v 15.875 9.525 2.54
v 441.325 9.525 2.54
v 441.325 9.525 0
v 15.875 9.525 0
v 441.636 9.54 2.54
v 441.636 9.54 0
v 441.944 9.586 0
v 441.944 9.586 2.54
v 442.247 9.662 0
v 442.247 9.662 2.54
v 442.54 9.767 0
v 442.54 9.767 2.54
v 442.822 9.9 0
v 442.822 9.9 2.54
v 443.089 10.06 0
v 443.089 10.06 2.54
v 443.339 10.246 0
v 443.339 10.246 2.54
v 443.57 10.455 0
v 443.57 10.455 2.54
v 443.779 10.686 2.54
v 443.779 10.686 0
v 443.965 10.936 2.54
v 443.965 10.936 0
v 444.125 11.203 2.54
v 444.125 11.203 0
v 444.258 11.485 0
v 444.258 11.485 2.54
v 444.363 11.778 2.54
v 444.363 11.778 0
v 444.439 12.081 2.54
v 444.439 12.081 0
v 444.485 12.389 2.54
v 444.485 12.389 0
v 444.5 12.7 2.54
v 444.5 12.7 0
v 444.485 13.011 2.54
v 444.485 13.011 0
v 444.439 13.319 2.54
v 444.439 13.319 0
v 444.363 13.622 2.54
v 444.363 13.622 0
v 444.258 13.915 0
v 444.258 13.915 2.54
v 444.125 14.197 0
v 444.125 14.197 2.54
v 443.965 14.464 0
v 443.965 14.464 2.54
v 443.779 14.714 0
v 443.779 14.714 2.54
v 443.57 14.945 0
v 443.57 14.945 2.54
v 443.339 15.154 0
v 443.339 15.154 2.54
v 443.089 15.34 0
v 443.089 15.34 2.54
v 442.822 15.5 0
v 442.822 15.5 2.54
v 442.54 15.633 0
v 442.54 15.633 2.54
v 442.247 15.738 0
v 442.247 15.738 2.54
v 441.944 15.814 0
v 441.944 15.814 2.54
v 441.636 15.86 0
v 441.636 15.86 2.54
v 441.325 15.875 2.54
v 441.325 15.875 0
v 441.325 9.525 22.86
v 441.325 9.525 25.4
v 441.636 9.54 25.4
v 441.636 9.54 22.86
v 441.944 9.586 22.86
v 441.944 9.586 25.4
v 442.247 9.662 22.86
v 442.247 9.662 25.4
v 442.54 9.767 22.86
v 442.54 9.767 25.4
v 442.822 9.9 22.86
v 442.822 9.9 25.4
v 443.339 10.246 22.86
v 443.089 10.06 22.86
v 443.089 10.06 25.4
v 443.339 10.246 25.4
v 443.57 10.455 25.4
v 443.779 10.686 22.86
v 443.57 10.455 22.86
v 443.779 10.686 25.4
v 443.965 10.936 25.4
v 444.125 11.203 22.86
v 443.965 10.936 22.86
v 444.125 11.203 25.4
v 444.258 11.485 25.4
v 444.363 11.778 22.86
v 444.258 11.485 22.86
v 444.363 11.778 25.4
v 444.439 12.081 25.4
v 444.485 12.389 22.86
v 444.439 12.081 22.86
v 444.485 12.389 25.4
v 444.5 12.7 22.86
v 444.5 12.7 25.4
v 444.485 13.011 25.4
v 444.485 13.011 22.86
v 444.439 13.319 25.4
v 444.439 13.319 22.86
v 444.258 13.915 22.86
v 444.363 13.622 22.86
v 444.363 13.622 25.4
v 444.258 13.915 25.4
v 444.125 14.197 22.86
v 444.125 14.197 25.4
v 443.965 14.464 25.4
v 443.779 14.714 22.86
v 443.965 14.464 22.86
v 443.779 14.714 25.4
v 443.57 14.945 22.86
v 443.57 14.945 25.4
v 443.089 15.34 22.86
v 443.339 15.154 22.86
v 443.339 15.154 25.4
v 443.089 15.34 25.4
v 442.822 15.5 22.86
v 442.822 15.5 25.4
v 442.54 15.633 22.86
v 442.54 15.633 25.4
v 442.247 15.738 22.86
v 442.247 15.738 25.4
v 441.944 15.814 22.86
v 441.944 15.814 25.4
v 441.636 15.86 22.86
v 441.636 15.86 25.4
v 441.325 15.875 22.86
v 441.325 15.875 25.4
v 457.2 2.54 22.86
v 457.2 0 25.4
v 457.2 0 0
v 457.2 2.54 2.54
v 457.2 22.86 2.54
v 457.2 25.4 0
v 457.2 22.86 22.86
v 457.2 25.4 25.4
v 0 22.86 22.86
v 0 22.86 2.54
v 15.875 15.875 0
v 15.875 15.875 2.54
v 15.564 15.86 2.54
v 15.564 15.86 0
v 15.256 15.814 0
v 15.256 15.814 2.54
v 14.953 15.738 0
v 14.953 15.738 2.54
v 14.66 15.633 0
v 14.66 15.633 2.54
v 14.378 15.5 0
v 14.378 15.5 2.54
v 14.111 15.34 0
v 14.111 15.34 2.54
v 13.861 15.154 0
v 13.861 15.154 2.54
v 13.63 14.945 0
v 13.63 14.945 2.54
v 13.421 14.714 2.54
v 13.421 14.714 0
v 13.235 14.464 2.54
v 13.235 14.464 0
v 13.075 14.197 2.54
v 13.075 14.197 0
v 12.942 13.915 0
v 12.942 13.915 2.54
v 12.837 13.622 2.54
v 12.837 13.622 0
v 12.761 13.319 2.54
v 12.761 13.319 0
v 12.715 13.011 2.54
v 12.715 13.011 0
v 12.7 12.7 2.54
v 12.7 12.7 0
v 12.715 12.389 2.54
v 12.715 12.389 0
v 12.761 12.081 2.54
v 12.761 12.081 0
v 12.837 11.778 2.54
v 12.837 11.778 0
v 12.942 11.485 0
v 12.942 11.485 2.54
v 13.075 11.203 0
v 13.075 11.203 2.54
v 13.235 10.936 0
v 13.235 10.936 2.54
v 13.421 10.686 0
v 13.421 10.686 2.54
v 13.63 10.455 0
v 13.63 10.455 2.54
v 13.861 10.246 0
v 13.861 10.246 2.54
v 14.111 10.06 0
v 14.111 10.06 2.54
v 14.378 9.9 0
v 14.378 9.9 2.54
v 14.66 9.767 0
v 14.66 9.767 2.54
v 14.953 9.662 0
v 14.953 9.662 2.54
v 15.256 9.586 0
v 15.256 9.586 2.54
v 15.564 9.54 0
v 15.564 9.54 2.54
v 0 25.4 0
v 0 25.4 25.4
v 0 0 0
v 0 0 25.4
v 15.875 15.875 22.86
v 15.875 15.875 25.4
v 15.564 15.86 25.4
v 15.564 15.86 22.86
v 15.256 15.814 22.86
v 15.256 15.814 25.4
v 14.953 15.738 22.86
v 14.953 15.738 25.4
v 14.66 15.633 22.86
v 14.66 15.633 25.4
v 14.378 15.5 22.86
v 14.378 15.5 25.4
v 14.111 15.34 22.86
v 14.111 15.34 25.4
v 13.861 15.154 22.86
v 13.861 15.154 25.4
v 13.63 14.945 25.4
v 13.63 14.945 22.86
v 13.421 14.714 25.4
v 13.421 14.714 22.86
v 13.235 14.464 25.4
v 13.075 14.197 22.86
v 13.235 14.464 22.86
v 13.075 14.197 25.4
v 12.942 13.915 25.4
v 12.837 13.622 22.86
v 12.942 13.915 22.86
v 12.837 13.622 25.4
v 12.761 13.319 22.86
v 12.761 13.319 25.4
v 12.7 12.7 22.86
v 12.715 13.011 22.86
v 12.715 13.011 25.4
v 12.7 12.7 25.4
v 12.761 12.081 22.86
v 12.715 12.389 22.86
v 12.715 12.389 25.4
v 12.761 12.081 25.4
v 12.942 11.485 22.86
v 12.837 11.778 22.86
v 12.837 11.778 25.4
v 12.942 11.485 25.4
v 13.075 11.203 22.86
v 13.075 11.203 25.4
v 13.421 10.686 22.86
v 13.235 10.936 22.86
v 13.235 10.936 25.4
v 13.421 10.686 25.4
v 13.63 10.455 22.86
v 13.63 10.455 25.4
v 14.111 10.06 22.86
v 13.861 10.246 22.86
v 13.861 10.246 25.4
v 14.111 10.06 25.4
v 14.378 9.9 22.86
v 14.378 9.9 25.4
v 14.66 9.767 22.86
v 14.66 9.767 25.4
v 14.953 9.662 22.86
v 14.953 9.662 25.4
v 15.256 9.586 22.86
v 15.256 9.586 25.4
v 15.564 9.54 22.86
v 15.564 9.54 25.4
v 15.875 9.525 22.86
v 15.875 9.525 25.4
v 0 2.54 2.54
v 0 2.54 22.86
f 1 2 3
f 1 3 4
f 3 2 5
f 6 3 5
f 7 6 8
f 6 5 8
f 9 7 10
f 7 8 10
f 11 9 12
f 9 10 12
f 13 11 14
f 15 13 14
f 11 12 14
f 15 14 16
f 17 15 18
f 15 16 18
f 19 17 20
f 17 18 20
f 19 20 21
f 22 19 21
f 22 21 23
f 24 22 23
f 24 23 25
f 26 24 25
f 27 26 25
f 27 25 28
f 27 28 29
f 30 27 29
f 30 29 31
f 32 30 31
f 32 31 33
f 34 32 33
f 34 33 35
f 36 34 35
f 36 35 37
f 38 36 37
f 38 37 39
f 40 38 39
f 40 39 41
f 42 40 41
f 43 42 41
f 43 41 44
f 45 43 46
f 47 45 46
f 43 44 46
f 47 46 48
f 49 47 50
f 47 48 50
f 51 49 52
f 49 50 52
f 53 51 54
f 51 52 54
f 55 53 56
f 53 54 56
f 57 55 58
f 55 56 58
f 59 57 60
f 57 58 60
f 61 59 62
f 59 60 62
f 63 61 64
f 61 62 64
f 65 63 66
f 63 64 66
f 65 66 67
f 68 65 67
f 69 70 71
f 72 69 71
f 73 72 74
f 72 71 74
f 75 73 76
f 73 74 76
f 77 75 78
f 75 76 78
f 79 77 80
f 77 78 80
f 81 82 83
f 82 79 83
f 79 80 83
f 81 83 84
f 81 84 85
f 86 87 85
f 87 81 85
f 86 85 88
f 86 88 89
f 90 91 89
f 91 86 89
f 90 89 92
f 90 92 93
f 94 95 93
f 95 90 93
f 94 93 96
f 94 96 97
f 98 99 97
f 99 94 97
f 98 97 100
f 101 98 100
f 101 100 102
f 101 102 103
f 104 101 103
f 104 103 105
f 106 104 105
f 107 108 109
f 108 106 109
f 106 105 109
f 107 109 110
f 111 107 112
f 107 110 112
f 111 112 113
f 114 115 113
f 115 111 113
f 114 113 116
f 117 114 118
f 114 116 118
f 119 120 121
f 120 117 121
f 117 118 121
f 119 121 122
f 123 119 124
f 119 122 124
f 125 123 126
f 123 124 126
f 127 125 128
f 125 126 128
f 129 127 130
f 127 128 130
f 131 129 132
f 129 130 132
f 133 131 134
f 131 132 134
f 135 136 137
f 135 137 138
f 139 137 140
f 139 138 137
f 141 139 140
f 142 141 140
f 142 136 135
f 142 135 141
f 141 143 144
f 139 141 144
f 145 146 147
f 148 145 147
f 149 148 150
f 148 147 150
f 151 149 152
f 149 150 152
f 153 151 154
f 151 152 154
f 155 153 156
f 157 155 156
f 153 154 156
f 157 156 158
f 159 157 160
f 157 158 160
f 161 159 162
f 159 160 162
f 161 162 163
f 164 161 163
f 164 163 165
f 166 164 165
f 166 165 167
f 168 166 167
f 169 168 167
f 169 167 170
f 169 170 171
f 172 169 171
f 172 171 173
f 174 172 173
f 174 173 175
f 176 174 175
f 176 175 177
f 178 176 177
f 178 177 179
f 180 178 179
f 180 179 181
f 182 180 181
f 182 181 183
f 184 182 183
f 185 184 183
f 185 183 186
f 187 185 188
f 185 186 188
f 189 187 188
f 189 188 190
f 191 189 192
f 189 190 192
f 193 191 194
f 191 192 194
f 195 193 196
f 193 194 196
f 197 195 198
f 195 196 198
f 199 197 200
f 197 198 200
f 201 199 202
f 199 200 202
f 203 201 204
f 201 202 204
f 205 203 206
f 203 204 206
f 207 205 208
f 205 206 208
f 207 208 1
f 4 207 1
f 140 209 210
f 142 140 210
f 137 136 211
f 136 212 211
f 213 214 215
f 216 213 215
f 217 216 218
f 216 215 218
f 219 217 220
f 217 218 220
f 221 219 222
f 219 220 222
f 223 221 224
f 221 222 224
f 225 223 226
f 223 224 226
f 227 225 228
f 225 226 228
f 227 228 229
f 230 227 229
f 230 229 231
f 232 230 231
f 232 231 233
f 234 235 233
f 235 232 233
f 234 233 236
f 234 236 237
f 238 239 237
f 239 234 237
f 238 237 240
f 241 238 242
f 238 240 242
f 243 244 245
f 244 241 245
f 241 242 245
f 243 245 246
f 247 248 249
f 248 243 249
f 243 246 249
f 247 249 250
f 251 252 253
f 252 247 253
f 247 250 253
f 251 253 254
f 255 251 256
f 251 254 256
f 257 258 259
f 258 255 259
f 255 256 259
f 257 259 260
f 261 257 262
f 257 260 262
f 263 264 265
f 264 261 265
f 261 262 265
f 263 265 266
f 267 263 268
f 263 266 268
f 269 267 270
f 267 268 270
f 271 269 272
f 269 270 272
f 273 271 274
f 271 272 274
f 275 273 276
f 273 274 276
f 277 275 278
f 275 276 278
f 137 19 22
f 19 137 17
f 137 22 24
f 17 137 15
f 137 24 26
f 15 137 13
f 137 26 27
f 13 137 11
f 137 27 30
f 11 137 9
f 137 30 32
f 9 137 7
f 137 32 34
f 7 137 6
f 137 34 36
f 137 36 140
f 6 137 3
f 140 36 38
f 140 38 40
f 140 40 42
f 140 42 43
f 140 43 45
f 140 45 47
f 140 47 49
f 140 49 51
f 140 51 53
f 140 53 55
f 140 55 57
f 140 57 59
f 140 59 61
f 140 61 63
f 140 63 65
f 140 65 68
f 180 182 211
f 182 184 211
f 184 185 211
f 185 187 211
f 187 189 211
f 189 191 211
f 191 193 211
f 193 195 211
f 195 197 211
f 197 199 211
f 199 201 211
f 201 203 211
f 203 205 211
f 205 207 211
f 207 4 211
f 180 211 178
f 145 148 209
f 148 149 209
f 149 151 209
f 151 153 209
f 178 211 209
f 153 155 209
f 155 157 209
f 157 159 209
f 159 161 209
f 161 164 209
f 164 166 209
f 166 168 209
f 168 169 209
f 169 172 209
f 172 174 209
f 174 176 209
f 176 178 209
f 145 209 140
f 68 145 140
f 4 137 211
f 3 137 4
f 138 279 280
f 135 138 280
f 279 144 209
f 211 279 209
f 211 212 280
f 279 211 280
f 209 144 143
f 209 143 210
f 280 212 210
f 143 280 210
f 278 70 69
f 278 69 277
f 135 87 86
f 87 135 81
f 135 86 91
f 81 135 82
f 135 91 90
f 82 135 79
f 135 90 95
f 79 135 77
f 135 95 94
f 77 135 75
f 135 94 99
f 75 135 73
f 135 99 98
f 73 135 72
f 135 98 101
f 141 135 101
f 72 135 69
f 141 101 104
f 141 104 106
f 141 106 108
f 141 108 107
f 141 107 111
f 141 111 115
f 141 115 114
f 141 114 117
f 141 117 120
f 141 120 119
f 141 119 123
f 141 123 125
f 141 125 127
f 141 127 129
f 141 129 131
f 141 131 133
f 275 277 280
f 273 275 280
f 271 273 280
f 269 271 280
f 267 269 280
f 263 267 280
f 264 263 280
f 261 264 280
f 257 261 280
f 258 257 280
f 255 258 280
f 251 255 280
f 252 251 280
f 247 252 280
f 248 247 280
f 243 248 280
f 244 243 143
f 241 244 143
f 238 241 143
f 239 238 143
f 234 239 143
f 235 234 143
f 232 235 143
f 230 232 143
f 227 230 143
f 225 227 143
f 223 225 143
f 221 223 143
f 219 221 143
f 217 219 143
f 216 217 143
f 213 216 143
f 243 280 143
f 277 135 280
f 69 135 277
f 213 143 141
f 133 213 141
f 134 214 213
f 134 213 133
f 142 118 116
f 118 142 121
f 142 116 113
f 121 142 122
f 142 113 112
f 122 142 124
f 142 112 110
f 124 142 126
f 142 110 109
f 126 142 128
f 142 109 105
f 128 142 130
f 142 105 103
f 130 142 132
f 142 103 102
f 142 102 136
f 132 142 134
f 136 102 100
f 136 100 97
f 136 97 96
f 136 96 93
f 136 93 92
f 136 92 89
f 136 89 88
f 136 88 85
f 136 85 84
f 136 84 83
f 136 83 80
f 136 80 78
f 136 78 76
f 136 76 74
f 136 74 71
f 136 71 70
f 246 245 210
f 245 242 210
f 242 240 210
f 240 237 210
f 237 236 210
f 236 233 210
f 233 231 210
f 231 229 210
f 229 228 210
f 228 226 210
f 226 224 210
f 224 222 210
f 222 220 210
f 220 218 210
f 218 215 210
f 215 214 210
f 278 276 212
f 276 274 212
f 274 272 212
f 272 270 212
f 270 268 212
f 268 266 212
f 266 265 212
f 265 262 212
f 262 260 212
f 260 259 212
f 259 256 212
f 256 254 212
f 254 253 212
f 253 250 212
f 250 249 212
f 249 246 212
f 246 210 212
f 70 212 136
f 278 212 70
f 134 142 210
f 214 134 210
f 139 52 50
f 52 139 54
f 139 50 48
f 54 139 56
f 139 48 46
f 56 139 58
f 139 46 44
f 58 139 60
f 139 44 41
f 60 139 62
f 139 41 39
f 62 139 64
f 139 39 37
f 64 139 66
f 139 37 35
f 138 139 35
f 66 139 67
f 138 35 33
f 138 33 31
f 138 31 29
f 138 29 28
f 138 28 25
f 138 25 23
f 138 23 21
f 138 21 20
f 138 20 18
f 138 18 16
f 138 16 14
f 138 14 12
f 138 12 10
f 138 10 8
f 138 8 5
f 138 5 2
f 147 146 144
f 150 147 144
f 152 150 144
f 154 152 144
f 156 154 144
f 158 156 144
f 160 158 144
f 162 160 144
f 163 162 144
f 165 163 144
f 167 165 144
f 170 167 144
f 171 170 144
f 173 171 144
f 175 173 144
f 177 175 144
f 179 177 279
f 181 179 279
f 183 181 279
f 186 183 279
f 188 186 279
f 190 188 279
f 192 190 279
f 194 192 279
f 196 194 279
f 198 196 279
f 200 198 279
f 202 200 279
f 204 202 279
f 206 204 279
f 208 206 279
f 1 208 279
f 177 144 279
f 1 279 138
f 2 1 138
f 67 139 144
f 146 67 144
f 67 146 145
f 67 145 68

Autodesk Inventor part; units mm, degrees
ref_plane "YZ Plane" through (0, 0, 0) normal (1, 0, 0) x (0, 1, 0)
ref_plane "XZ Plane" through (0, 0, 0) normal (0, 1, 0) x (-1, 0, 0)
ref_plane "XY Plane" through (0, 0, 0) normal (0, 0, 1) x (1, 0, 0)
sketch "Sketch1" plane through (0, 0, 0) normal (1, 0, 0) x (0, 1, 0)
  line L0 (0, 0) -> (25.4, 0)
  line L1 (25.4, 0) -> (25.4, 25.4)
  line L2 (25.4, 25.4) -> (0, 25.4)
  line L3 (0, 25.4) -> (0, 0)
  line L4 (22.86, 22.86) -> (22.86, 2.54)
  line L5 (22.86, 2.54) -> (2.54, 2.54)
  line L6 (2.54, 2.54) -> (2.54, 22.86)
  line L7 (2.54, 22.86) -> (22.86, 22.86)
  dimension "d0" = 2.54
  dimension "d1" = 25.4
  dimension "d2" = 25.4
extrude "Extrusion1" add sketch "Sketch1" along normal blind 457.2
sketch "Sketch2" plane through (0, 0, 25.4) normal (0, 0, 1) x (1, 0, 0)
  line L0 (15.875, 15.875) -> (441.325, 15.875)
  line L1 (444.5, 12.7) -> (444.5, 12.7)
  line L2 (441.325, 9.525) -> (15.875, 9.525)
  line L3 (12.7, 12.7) -> (12.7, 12.7)
  line L4 (457.2, 25.4) -> (457.2, 0) projected
  line L5 (0, 25.4) -> (0, 0) projected
  line L6 (0, 25.4) -> (457.2, 25.4) projected
  arc A0 (15.875, 15.875) -> (12.7, 12.7) centre (15.875, 12.7) ccw
  arc A1 (12.7, 12.7) -> (15.875, 9.525) centre (15.875, 12.7) ccw
  arc A2 (444.5, 12.7) -> (441.325, 15.875) centre (441.325, 12.7) ccw
  arc A3 (441.325, 9.525) -> (444.5, 12.7) centre (441.325, 12.7) ccw
  point P0 (12.7, 15.875)
  point P1 (12.7, 9.525)
  dimension "d5" = 6.35
  dimension "d6" = 12.7
  dimension "d7" = 12.7
  dimension "d8" = 9.525
  dimension "d9" = 3.175
extrude "Extrusion2" cut sketch "Sketch2" against normal blind 457.2
properties part number "Rail"
